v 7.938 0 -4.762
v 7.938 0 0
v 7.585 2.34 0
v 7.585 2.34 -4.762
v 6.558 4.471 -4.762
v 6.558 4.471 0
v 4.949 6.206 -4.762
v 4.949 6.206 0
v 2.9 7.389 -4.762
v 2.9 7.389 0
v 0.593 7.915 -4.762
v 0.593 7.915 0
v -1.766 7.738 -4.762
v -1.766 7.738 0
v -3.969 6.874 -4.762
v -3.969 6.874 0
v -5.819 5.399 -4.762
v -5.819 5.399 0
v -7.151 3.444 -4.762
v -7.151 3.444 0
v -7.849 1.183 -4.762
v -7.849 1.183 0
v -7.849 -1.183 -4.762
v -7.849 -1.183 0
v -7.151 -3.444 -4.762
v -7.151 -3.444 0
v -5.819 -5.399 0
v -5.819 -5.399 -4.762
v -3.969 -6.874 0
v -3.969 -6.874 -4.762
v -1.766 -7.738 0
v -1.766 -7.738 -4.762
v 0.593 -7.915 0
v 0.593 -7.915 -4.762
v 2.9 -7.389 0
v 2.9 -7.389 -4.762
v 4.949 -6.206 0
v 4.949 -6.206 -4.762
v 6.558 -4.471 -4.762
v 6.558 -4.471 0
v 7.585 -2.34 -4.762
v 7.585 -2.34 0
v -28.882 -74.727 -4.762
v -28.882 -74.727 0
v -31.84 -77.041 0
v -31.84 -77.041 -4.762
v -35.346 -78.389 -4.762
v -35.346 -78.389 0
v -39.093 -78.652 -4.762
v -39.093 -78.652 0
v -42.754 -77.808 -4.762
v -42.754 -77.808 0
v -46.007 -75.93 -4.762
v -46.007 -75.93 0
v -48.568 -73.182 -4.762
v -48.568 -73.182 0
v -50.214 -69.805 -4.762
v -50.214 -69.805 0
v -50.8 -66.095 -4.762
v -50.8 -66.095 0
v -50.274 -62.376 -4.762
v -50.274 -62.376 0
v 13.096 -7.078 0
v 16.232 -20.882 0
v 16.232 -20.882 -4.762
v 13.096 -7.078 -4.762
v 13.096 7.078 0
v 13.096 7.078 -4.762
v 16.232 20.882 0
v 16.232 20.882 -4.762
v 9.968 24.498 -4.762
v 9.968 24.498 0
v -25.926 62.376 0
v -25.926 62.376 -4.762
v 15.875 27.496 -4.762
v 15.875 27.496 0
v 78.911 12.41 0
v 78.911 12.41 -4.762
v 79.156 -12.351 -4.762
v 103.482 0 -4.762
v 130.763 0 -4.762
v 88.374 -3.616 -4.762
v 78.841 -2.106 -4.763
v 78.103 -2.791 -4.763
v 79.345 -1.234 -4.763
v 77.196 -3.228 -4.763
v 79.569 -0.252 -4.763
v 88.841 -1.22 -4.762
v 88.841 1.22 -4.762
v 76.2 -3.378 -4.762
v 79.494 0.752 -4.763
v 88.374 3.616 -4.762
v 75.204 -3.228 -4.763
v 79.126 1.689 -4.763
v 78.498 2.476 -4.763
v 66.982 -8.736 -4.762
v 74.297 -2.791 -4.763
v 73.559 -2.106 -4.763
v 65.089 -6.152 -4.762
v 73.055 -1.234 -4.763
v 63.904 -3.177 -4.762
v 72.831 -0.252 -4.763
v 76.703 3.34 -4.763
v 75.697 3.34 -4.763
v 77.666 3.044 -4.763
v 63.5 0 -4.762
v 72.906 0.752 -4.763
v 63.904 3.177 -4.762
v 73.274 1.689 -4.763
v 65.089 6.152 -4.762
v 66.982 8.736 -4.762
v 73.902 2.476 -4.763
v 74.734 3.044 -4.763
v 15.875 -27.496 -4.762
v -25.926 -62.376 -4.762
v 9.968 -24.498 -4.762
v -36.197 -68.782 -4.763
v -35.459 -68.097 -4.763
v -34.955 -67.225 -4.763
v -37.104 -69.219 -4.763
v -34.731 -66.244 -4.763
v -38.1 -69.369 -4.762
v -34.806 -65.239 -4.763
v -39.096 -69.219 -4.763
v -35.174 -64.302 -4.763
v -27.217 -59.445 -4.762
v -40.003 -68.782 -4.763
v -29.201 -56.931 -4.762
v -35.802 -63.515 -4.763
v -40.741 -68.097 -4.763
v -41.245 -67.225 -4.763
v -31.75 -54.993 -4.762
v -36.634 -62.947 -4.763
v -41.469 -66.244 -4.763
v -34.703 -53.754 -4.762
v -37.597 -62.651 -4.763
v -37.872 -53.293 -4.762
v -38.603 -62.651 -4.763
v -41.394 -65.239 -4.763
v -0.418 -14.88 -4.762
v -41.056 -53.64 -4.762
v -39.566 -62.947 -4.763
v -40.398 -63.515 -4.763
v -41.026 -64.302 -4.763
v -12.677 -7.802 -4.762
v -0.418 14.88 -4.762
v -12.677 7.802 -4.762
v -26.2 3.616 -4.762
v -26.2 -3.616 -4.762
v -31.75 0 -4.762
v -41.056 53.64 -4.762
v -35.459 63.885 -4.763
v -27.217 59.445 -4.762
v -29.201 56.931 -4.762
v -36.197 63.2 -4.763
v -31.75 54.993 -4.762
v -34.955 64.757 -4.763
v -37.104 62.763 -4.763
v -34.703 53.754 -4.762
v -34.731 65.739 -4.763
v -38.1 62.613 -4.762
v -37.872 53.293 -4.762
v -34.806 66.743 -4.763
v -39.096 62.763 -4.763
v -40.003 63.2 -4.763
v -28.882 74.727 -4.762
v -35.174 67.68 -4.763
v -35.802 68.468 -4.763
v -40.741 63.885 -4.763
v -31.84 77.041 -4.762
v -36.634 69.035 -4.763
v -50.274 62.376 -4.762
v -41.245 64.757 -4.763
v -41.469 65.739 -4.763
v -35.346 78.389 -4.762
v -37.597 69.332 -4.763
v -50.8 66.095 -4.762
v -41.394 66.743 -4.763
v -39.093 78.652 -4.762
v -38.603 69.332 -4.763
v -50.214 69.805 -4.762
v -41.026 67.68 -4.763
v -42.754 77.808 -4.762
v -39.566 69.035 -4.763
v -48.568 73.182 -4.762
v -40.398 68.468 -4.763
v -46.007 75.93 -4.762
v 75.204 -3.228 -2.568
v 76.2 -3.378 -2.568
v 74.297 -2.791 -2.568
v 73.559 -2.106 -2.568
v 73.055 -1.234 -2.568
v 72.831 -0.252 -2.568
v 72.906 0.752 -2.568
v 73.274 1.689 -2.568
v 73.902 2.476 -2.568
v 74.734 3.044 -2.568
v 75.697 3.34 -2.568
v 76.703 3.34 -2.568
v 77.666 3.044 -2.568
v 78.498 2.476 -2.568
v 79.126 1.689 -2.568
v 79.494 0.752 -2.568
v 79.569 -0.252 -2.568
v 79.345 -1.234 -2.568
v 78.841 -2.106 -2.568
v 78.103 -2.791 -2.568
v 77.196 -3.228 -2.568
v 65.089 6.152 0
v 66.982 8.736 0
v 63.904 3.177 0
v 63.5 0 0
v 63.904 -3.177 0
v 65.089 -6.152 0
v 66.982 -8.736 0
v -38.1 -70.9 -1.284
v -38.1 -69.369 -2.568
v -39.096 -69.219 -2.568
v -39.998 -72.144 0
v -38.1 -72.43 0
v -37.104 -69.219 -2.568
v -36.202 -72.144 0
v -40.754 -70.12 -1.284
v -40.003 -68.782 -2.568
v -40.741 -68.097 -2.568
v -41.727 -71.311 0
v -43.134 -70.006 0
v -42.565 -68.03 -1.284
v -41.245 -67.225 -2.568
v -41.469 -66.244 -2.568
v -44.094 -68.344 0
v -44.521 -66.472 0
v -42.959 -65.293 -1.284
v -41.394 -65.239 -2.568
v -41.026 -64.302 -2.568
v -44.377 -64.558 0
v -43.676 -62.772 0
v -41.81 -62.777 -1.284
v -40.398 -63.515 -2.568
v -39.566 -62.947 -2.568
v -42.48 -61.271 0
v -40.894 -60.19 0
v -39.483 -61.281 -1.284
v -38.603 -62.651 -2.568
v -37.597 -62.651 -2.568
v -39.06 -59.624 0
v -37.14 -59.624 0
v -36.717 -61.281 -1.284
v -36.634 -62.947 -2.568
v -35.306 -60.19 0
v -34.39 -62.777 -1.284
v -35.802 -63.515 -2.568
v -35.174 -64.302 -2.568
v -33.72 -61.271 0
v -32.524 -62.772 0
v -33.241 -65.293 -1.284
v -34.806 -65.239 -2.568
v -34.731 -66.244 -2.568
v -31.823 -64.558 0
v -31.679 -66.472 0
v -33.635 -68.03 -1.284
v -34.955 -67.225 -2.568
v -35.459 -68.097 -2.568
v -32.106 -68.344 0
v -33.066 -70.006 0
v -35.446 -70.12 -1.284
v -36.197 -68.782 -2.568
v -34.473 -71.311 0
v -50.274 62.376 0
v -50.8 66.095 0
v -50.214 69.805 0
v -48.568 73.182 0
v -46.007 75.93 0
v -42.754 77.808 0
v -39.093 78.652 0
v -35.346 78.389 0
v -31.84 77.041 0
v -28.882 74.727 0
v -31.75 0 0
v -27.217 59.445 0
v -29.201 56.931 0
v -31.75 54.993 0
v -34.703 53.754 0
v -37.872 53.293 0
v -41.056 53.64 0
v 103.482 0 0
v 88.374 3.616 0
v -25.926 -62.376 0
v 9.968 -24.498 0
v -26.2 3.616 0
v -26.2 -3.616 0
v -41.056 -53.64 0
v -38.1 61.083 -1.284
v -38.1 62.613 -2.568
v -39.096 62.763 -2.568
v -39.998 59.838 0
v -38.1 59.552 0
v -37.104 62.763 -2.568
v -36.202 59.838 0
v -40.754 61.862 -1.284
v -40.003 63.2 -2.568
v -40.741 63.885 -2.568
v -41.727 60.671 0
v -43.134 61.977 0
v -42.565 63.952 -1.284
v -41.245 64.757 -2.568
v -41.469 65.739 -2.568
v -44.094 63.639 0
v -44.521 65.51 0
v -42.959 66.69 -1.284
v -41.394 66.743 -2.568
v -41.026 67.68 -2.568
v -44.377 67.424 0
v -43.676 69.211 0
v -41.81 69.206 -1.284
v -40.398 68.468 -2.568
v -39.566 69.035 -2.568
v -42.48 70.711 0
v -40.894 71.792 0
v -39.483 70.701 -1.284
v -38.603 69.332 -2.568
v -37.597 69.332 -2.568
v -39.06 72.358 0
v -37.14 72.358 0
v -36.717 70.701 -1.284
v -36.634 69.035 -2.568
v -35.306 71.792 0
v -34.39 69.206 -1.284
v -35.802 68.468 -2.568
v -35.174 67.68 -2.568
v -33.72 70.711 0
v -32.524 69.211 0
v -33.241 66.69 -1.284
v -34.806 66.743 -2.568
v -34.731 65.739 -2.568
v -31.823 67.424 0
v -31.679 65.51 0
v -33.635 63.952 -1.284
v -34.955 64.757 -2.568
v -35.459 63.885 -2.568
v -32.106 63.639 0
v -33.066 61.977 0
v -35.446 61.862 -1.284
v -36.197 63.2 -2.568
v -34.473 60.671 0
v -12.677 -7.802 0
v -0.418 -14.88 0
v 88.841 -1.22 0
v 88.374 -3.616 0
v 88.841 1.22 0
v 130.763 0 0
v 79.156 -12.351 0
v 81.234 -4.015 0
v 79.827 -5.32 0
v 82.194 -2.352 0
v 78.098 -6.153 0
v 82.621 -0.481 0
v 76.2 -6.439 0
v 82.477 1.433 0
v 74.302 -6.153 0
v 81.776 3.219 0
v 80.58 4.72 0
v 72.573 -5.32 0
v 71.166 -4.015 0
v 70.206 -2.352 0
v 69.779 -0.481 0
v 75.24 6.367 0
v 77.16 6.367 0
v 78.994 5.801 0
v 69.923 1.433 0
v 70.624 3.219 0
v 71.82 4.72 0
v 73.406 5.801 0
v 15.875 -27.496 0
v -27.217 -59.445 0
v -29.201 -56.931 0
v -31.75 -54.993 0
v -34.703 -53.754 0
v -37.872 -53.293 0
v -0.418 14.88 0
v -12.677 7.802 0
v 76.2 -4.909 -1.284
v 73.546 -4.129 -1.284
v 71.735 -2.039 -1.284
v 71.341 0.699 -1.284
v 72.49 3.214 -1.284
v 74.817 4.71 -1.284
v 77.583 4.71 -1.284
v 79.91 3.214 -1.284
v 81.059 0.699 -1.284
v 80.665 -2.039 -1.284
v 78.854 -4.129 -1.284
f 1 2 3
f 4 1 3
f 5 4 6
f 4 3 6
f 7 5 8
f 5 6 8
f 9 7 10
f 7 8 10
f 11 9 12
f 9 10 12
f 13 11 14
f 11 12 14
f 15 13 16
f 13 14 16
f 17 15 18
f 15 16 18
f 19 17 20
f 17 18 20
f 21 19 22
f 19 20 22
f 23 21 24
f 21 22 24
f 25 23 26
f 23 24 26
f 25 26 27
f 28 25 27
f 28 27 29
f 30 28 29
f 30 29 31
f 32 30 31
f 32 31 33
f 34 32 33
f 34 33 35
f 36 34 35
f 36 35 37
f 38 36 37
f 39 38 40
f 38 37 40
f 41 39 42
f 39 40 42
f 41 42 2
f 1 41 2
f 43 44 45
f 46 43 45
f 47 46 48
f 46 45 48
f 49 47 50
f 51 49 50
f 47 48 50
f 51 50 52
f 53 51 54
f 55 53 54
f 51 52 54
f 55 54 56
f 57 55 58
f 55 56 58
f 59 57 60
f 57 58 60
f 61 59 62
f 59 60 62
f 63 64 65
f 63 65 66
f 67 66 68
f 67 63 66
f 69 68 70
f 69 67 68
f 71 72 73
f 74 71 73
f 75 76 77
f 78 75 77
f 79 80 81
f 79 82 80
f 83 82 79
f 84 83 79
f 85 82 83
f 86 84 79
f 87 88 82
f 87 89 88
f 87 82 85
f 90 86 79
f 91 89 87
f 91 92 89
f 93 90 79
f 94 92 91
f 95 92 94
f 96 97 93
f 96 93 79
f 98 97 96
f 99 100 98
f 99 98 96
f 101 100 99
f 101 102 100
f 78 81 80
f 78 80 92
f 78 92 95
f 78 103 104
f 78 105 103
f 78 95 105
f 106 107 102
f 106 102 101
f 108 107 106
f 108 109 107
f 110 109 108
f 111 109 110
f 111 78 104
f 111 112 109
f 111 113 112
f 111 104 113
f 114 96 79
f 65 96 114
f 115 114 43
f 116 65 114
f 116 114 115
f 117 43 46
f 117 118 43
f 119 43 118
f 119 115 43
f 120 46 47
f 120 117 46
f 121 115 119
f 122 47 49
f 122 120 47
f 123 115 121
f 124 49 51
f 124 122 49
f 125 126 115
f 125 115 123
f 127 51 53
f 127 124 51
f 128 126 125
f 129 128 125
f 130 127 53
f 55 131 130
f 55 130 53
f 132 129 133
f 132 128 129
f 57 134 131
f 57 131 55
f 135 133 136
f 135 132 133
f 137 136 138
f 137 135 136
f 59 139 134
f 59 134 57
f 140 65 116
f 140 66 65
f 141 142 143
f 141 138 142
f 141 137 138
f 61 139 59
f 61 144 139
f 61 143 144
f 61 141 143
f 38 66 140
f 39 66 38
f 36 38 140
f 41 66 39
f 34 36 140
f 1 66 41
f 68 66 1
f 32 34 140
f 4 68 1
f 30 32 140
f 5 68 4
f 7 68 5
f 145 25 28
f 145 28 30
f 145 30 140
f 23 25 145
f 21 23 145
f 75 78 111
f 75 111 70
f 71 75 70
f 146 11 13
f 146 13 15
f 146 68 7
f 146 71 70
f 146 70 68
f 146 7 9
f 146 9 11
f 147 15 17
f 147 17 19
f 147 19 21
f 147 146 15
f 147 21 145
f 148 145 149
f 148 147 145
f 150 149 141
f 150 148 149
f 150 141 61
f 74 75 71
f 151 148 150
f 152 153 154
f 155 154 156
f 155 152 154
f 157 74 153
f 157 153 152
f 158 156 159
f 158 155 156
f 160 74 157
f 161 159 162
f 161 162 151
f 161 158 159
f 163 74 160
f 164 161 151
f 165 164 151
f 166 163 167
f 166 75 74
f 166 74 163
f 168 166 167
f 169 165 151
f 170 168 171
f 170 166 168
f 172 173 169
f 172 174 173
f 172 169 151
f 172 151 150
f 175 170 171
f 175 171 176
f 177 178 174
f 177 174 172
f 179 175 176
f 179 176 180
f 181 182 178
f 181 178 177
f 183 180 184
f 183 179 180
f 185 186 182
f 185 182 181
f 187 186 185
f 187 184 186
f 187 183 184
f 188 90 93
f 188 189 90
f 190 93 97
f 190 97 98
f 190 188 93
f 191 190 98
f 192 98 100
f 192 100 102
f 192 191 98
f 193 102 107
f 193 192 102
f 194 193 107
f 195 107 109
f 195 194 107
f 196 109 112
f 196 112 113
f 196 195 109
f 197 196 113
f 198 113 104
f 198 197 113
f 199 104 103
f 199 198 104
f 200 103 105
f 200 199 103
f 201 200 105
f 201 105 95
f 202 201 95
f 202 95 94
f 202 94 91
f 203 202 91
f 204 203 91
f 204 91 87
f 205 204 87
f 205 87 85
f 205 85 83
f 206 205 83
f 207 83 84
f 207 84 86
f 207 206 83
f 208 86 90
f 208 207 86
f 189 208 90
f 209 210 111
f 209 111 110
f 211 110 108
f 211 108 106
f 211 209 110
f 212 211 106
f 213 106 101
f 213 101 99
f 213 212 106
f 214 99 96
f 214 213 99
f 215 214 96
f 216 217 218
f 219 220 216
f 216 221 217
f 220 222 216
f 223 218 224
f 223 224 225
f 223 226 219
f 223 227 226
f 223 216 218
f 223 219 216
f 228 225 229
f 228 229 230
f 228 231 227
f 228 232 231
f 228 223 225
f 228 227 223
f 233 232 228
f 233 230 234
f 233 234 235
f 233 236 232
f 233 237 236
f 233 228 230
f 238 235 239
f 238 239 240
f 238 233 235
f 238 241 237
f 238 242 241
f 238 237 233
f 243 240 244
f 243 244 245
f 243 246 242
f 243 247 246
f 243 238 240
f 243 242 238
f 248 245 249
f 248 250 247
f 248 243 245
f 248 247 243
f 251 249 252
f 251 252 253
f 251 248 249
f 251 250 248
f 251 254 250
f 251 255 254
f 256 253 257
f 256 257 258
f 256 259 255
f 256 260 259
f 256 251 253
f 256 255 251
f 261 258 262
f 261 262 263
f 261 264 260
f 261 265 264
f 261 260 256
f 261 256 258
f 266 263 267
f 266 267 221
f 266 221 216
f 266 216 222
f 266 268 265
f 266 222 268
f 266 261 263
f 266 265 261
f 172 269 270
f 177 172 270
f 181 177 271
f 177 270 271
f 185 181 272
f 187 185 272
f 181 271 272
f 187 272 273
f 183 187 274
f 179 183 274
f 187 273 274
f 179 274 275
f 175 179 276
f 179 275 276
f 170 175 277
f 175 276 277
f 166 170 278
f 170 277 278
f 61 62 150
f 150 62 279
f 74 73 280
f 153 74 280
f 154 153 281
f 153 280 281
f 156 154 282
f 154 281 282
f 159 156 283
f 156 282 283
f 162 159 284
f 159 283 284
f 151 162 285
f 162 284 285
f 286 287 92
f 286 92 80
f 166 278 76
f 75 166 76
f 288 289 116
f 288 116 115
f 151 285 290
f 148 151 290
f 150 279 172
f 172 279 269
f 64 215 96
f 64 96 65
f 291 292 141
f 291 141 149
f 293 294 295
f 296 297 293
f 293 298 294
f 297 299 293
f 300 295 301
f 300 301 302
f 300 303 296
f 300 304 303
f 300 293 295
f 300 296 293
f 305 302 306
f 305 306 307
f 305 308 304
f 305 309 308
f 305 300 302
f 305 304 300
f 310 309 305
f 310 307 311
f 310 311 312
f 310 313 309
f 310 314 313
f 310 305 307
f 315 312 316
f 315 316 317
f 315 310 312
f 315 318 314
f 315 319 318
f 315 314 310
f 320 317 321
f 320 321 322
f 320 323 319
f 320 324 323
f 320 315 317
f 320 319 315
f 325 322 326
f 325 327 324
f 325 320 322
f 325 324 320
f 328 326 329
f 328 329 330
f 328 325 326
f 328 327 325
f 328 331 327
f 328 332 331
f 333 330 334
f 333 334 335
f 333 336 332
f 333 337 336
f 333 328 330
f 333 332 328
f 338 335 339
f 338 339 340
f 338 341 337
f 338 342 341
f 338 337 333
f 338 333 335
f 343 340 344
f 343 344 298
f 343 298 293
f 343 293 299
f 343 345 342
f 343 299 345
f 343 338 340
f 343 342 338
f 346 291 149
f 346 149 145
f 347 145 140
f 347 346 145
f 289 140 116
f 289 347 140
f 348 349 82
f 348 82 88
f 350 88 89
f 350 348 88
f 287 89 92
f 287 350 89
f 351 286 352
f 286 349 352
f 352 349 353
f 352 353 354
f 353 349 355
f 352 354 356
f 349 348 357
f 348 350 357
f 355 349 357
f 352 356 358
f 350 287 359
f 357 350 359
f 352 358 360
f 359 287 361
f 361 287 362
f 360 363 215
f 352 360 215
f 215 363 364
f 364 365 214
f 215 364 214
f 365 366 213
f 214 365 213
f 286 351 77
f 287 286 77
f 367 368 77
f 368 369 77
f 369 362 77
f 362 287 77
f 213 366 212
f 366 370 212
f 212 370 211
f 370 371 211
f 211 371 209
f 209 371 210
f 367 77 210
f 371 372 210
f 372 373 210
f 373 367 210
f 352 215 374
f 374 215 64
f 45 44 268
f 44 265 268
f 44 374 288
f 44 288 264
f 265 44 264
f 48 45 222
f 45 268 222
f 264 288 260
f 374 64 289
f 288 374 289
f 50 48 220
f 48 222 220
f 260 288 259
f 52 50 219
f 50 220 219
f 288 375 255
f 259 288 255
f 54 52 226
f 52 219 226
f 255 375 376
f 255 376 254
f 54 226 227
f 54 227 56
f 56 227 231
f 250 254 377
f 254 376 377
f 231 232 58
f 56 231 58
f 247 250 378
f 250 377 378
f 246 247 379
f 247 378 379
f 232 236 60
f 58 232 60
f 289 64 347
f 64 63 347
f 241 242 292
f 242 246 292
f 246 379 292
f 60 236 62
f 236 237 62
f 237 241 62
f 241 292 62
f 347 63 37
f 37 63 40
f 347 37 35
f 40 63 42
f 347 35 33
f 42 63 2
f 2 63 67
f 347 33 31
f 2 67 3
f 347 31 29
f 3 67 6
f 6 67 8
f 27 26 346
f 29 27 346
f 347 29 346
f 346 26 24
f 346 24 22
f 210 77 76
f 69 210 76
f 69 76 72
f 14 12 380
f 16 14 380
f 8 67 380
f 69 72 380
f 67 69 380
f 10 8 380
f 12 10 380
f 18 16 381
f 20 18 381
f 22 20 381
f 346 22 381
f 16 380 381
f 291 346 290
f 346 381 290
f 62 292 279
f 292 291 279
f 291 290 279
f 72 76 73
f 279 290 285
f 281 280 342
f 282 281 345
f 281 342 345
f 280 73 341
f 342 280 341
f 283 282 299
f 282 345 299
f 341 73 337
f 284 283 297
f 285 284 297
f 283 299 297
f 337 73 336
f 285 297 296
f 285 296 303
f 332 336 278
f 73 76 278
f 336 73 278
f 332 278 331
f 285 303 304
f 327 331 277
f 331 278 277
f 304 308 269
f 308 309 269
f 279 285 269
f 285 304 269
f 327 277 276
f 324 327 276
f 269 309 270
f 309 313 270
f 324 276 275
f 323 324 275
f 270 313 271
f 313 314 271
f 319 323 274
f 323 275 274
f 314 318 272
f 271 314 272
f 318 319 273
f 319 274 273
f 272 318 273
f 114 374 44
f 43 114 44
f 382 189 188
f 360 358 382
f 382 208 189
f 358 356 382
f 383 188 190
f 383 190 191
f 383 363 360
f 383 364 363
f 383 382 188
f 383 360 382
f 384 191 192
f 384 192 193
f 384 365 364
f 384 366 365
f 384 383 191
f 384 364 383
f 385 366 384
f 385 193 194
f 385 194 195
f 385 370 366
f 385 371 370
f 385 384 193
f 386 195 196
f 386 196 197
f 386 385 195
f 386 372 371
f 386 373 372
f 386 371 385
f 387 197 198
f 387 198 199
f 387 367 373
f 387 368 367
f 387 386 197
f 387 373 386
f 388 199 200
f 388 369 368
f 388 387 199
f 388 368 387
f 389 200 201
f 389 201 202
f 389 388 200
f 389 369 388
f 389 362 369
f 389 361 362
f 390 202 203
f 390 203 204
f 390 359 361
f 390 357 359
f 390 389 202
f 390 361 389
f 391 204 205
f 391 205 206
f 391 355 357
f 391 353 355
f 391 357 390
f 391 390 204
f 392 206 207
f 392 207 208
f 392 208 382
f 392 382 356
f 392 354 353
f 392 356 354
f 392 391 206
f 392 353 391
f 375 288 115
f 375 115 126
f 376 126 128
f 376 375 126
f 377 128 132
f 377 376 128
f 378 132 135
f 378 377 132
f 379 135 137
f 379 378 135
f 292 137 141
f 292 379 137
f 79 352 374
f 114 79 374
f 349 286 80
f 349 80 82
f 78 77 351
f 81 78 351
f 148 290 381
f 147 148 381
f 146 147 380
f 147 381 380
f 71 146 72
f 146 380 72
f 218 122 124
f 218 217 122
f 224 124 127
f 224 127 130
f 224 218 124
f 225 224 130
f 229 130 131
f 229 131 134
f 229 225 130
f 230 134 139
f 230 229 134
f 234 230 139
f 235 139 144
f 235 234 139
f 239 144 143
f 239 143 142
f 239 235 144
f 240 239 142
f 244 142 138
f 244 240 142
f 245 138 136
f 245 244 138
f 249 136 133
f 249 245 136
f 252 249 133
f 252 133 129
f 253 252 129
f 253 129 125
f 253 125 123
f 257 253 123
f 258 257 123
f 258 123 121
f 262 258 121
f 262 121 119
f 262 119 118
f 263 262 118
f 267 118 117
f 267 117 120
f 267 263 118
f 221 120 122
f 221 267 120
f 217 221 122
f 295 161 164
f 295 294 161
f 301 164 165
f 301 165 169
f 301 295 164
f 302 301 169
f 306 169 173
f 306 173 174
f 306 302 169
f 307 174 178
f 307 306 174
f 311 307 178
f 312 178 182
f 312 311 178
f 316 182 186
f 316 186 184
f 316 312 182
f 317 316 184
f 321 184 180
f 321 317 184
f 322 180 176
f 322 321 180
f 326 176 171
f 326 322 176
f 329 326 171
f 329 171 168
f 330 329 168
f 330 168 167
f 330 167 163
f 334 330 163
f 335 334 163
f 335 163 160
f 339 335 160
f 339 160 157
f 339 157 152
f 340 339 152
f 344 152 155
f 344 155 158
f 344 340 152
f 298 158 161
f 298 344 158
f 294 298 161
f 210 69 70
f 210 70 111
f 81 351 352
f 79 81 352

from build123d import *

# Parameters (mm, degrees)
SKETCH1_R                                   = 7.9375
BOSS_EXTRUDE1_DEPTH                         = 4.7625
CSK_FOR_1_4_FLAT_HEAD_MACHINE_SCREW_2_COUNT = 2
CSK_FOR_1_4_FLAT_HEAD_MACHINE_SCREW_2_PITCH = 131.982271537
CSK_FOR_1_4_FLAT_HEAD_MACHINE_SCREW_3_COUNT = 2
CSK_FOR_1_4_FLAT_HEAD_MACHINE_SCREW_3_PITCH = 131.982271537


with BuildPart() as part:
    # Sketch1 → Boss-Extrude1 (new body)
    with BuildSketch(Plane.XY):
        with BuildLine():
            Line((-31.75, 0), (-50.274457233, 62.375531935))
            ThreePointArc((-50.274457233, 62.375531935), (-44.45, 76.989658396), (-28.881566614, 74.726723093))
            Line((-28.881566614, 74.726723093), (15.875, 27.49630657))
            Line((15.875, 27.49630657), (78.9111987, 12.409785423))
            Line((78.9111987, 12.409785423), (130.763159277, 0))
            Line((130.763159277, 0), (79.156023847, -12.351191158))
            Line((79.156023847, -12.351191158), (15.875, -27.49630657))
            Line((15.875, -27.49630657), (-28.881566614, -74.726723093))
            ThreePointArc((-28.881566614, -74.726723093), (-44.45, -76.989658396), (-50.274457233, -62.375531935))
            Line((-50.274457233, -62.375531935), (-31.75, 0))
        make_face()
        Circle(SKETCH1_R, mode=Mode.SUBTRACT)
        with BuildLine():
            Line((9.968214912, 24.497802386), (-25.925542767, 62.375531935))
            ThreePointArc((-25.925542767, 62.375531935), (-31.75, 54.99261314), (-41.056023847, 53.639944611))
            Line((-41.056023847, 53.639944611), (-26.199826659, 3.616173849))
            ThreePointArc((-26.199826659, 3.616173849), (-6.35, 10.998522628), (9.968214912, 24.497802386))
        make_face(mode=Mode.SUBTRACT)
        with BuildLine():
            Line((16.231611747, 20.881628537), (66.981566614, 8.735587325))
            ThreePointArc((66.981566614, 8.735587325), (63.5, 0), (66.981566614, -8.735587325))
            Line((66.981566614, -8.735587325), (16.231611747, -20.881628537))
            ThreePointArc((16.231611747, -20.881628537), (12.7, 0), (16.231611747, 20.881628537))
        make_face(mode=Mode.SUBTRACT)
        with BuildLine():
            Line((88.374457233, 3.615603833), (103.481579639, 0))
            Line((103.481579639, 0), (88.374457233, -3.615603833))
            ThreePointArc((88.374457233, -3.615603833), (88.9, 0), (88.374457233, 3.615603833))
        make_face(mode=Mode.SUBTRACT)
        with BuildLine():
            Line((9.968214912, -24.497802386), (-25.925542767, -62.375531935))
            ThreePointArc((-25.925542767, -62.375531935), (-31.75, -54.99261314), (-41.056023847, -53.639944611))
            Line((-41.056023847, -53.639944611), (-26.199826659, -3.616173849))
            ThreePointArc((-26.199826659, -3.616173849), (-6.35, -10.998522628), (9.968214912, -24.497802386))
        make_face(mode=Mode.SUBTRACT)
    extrude(amount=-BOSS_EXTRUDE1_DEPTH)

    # Sketch3 → CSK for 1/4 Flat Head Machine Screw (100)1 (revolve, cut)
    with BuildSketch(Plane(origin=(76.2, 0, 0), x_dir=(0, -1, 0), z_dir=(1, 0, 0))):
        Polygon((0, 0), (0, 4.7625), (3.3782, 4.7625), (3.3782, 2.568232241), (6.4389, 0), align=None)
    csk_for_1_4_flat_head_machine_screw_100 = revolve(axis=Axis((76.2, 0, 6.35), (0, 0, -1)), mode=Mode.SUBTRACT)

    # CSK for 1_4 Flat Head Machine Screw  2: CSK for 1/4 Flat Head Machine Screw (100)1 ×2
    with Locations(*[Vector(-0.866025404, 0.5, 0) * (i * CSK_FOR_1_4_FLAT_HEAD_MACHINE_SCREW_2_PITCH) for i in range(1, CSK_FOR_1_4_FLAT_HEAD_MACHINE_SCREW_2_COUNT)]):
        add(csk_for_1_4_flat_head_machine_screw_100, mode=Mode.SUBTRACT)

    # CSK for 1_4 Flat Head Machine Screw  3: CSK for 1/4 Flat Head Machine Screw (100)1 ×2
    with Locations(*[Vector(-0.866025404, -0.5, 0) * (i * CSK_FOR_1_4_FLAT_HEAD_MACHINE_SCREW_3_PITCH) for i in range(1, CSK_FOR_1_4_FLAT_HEAD_MACHINE_SCREW_3_COUNT)]):
        add(csk_for_1_4_flat_head_machine_screw_100, mode=Mode.SUBTRACT)


solid = part.part
